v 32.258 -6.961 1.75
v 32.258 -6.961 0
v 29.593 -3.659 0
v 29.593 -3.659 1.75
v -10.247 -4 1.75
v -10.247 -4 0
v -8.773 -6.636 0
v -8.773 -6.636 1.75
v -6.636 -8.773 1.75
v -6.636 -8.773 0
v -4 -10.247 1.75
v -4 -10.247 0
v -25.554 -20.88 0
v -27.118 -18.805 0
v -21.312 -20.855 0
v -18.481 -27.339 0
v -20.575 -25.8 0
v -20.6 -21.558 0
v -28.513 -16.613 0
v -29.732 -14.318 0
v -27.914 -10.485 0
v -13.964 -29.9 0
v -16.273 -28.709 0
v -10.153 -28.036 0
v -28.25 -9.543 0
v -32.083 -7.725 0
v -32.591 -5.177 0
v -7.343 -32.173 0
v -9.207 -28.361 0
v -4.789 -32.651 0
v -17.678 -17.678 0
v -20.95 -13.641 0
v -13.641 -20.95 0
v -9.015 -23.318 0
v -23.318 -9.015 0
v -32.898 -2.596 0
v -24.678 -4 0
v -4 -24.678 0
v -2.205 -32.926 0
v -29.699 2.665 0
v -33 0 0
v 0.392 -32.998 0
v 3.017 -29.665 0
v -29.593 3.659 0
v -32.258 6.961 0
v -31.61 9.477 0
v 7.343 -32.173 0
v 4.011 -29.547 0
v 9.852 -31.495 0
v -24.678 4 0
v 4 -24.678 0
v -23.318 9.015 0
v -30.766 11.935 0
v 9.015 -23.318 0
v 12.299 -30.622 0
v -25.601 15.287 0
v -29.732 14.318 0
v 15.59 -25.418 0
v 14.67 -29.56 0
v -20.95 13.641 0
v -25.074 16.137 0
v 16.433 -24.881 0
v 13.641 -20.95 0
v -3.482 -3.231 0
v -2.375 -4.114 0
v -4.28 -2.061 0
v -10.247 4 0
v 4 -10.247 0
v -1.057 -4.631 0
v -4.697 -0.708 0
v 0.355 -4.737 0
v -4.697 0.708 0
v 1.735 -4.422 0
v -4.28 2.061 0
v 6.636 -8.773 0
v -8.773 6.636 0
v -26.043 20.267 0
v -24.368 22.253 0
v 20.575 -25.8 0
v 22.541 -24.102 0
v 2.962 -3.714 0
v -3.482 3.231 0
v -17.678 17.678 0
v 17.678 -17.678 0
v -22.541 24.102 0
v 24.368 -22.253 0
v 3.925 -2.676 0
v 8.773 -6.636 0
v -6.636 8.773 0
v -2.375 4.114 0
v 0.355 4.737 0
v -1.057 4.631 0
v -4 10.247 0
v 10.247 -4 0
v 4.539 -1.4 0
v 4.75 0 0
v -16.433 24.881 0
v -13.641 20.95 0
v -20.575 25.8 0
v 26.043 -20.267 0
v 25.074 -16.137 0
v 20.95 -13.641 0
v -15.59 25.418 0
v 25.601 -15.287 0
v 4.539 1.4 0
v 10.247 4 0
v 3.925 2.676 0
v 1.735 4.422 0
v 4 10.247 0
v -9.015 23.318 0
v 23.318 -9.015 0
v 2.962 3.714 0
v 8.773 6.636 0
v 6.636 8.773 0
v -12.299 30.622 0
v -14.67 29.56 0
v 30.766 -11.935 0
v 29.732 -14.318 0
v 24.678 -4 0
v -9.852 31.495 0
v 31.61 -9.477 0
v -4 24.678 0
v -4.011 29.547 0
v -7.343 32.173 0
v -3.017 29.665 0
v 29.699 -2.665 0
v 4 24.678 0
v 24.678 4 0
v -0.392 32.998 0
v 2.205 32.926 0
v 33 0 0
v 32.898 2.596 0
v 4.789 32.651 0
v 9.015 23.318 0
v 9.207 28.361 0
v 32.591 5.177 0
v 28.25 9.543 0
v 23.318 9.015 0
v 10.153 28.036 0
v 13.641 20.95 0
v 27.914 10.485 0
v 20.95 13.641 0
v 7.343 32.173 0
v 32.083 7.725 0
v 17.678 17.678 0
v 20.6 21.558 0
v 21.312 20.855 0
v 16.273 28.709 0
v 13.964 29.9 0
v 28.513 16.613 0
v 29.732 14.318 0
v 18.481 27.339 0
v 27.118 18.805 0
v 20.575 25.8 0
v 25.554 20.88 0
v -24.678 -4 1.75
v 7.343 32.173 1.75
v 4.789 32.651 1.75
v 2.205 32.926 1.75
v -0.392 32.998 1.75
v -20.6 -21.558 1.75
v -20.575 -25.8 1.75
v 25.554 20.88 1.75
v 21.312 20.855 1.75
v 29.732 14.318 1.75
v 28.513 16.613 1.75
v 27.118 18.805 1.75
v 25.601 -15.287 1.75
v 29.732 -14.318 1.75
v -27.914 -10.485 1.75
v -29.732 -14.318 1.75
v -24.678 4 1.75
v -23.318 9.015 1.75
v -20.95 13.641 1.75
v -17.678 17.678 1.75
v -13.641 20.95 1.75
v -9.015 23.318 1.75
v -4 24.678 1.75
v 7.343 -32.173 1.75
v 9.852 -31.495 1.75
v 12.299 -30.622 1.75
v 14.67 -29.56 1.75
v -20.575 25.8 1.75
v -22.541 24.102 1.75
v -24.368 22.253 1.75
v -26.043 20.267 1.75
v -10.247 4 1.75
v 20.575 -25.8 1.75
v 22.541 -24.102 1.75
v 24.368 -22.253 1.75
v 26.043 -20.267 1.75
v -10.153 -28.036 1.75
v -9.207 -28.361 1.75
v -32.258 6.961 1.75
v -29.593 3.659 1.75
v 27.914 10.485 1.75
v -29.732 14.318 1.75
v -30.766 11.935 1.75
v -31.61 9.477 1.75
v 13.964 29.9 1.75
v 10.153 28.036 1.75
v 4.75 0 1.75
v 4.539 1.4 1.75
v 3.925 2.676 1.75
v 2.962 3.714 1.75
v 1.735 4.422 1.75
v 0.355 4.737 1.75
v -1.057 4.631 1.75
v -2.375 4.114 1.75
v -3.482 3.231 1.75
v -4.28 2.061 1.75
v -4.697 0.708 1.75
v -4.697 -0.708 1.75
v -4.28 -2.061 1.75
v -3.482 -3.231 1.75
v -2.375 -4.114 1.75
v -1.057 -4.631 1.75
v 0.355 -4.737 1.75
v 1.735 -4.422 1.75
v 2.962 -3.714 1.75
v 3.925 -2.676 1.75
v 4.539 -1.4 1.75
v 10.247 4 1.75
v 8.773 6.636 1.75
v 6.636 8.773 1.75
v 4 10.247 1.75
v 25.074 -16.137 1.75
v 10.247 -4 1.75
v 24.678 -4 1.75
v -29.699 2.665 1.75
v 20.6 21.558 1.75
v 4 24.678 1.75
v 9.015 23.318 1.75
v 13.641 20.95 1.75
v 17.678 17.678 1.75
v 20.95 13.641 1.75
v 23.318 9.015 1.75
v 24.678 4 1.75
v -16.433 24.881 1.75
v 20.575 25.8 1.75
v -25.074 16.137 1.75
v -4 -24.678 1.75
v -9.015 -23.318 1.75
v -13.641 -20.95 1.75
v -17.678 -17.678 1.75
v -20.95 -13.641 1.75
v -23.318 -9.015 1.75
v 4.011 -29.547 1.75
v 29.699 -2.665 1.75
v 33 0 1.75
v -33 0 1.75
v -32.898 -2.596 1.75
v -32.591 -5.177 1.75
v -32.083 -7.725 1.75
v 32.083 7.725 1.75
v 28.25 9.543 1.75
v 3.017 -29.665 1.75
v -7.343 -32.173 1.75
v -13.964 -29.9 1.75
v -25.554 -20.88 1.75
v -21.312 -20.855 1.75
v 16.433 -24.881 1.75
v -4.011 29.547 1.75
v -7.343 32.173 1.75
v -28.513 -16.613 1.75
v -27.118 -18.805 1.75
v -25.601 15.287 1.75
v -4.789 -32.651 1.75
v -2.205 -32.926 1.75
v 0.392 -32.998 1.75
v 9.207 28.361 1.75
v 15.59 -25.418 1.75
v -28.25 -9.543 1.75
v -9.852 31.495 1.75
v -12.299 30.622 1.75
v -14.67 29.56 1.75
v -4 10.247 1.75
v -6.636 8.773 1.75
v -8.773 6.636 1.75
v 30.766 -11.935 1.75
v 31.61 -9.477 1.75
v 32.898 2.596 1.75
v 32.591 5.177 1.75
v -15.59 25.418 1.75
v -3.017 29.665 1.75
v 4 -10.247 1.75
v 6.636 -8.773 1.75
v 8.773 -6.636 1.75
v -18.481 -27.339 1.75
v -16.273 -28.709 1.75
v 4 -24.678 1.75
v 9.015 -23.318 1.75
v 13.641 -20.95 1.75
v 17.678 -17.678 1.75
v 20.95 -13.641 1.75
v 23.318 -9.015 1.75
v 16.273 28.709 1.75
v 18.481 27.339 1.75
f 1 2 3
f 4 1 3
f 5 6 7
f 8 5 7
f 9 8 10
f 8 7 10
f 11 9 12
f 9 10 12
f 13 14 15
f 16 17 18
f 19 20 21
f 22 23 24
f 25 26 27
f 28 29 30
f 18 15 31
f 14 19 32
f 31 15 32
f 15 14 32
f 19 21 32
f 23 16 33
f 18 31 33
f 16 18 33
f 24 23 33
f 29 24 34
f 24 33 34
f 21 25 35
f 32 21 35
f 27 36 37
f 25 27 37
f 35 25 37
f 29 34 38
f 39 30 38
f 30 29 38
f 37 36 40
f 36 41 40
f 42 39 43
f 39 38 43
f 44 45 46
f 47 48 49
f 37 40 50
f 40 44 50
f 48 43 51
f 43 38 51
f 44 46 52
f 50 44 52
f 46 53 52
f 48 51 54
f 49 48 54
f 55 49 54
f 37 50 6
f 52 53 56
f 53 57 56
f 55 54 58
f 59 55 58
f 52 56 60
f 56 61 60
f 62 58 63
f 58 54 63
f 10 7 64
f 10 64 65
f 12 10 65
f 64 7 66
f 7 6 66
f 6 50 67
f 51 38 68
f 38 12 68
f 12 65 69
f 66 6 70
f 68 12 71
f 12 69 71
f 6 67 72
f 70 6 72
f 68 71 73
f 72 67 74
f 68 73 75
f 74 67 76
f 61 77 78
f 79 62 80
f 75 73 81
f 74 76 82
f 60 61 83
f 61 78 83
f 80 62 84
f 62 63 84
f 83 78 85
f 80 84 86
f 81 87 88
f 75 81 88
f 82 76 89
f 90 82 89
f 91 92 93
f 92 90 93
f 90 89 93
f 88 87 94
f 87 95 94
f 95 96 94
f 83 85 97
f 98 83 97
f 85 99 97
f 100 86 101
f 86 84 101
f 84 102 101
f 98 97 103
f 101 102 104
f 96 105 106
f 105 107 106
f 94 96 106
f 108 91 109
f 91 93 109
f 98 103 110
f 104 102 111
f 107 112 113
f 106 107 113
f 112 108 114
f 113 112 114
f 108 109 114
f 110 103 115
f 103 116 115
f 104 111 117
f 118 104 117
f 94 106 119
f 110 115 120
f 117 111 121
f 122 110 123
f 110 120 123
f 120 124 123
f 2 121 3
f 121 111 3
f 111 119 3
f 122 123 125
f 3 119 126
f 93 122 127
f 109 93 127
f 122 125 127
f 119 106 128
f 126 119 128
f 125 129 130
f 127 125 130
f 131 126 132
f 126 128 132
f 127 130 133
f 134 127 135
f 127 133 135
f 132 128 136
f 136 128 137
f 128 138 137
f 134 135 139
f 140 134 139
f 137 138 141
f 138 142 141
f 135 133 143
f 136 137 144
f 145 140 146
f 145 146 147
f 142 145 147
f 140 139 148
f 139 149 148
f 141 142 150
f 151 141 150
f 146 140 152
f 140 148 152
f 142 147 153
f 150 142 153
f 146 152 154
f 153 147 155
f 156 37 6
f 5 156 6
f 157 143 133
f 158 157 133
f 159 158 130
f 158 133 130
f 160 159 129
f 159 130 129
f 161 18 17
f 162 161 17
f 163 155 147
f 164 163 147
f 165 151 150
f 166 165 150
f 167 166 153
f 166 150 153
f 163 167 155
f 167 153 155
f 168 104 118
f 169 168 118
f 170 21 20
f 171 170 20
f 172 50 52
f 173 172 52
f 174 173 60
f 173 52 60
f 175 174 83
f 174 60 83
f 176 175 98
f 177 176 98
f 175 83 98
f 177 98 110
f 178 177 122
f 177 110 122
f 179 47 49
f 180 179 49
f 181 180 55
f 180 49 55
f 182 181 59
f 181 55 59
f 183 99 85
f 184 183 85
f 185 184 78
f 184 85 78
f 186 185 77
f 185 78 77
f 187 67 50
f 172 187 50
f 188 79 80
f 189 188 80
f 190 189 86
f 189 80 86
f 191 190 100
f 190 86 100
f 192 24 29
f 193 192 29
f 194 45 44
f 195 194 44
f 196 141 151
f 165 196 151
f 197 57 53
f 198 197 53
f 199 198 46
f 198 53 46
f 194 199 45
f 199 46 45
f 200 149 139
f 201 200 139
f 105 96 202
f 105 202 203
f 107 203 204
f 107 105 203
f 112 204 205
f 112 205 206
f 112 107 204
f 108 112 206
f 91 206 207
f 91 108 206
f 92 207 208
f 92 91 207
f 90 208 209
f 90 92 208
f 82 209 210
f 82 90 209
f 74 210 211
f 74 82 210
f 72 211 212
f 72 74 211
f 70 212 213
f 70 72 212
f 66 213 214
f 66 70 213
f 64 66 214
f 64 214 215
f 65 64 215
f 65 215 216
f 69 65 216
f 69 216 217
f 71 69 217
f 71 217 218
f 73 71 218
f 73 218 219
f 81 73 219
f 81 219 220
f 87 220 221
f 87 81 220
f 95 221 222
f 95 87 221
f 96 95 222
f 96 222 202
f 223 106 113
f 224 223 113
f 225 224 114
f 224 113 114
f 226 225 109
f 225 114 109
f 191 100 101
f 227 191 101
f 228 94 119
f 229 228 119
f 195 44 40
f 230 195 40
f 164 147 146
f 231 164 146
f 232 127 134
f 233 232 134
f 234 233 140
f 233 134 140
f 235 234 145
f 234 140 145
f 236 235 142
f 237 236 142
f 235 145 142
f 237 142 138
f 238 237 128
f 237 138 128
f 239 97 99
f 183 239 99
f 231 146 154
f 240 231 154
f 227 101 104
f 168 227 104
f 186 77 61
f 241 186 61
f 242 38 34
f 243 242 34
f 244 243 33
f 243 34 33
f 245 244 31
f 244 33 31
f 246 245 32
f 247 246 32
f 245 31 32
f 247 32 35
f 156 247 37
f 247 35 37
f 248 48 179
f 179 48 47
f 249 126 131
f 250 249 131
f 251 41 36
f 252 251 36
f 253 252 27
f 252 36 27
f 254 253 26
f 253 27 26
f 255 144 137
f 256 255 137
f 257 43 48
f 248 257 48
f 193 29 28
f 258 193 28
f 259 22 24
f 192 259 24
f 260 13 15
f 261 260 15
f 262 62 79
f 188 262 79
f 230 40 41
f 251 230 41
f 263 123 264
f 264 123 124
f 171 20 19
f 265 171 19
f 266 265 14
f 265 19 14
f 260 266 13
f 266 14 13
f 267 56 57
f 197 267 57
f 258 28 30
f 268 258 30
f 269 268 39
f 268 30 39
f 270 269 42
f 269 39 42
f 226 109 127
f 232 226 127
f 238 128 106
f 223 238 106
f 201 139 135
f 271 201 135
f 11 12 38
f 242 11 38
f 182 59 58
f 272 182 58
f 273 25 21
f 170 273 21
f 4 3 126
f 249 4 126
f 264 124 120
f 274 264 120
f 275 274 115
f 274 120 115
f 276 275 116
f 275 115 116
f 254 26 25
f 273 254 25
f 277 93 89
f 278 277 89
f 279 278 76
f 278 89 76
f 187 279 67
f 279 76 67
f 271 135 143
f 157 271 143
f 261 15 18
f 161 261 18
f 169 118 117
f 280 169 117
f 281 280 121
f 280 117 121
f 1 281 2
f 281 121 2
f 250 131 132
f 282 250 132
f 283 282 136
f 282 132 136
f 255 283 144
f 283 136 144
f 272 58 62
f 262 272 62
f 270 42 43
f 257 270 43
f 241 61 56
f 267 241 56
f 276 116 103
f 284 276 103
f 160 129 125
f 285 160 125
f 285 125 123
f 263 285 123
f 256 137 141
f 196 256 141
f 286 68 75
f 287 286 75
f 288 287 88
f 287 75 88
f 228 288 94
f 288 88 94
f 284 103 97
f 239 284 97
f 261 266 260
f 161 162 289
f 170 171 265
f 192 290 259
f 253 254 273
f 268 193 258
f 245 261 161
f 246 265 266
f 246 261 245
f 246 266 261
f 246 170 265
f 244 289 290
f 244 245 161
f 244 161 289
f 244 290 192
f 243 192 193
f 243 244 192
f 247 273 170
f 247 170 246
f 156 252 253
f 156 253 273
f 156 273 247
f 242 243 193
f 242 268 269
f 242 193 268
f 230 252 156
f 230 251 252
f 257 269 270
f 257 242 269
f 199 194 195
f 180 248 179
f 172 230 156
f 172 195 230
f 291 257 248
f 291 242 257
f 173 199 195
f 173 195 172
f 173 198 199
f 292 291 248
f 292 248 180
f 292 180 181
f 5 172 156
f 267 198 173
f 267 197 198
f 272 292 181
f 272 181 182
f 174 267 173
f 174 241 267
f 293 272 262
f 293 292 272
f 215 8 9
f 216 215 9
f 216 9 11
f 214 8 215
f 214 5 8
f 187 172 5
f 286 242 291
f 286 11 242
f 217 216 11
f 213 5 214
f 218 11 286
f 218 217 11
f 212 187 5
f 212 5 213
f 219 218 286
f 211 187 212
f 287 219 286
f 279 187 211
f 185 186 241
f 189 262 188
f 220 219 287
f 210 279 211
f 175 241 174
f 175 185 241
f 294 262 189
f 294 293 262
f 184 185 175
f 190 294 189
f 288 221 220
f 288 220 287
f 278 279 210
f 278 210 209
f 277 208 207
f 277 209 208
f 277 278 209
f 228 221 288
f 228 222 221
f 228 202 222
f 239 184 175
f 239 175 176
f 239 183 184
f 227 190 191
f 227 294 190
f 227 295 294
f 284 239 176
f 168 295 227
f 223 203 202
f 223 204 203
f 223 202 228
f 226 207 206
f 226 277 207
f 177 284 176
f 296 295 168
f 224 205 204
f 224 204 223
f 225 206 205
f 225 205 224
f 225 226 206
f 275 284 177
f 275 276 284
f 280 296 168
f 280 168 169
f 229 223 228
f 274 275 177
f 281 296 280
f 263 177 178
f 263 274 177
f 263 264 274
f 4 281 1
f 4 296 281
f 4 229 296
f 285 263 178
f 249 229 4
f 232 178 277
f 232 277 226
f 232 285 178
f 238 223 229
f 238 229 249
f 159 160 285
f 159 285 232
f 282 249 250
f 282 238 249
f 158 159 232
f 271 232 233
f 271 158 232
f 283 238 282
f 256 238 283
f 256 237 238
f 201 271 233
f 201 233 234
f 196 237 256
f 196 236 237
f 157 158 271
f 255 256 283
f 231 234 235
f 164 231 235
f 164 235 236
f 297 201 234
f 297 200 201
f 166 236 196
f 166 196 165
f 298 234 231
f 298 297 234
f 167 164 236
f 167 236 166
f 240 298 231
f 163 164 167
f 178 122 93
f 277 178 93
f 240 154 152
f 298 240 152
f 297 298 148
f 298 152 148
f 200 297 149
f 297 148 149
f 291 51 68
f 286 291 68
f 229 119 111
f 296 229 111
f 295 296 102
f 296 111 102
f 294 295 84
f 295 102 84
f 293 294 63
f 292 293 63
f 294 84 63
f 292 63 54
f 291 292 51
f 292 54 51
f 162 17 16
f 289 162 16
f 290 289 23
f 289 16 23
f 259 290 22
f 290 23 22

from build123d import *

# Parameters (mm, degrees)
SKETCH1_R           = 4.75
BOSS_EXTRUDE1_DEPTH = 1.75


with BuildPart() as part:
    # Sketch1 → Boss-Extrude1 (new body)
    with BuildSketch(Plane.XY):
        with BuildLine():
            Line((-29.69873918, 2.664897184), (-33, 0))
            ThreePointArc((-33, 0), (-32.769980082, -3.889525088), (-32.083126945, -7.724827859))
            Line((-32.083126945, -7.724827859), (-28.249774158, -9.542905528))
            Line((-28.249774158, -9.542905528), (-27.913894972, -10.484810604))
            Line((-27.913894972, -10.484810604), (-29.731972641, -14.318163391))
            ThreePointArc((-29.731972641, -14.318163391), (-27.837130167, -17.722702504), (-25.554221367, -20.880176492))
            Line((-25.554221367, -20.880176492), (-21.311655509, -20.854978431))
            Line((-21.311655509, -20.854978431), (-20.600361522, -21.557873064))
            Line((-20.600361522, -21.557873064), (-20.575163461, -25.800438921))
            ThreePointArc((-20.575163461, -25.800438921), (-17.390795223, -28.045681335), (-13.963988845, -29.899950092))
            Line((-13.963988845, -29.899950092), (-10.152502116, -28.036467086))
            Line((-10.152502116, -28.036467086), (-9.206673827, -28.361134373))
            Line((-9.206673827, -28.361134373), (-7.343190821, -32.172621102))
            ThreePointArc((-7.343190821, -32.172621102), (-3.5, -32.813869019), (0.391982924, -32.997671878))
            Line((0.391982924, -32.997671878), (3.017478833, -29.66498959))
            Line((3.017478833, -29.66498959), (4.010508532, -29.547125193))
            Line((4.010508532, -29.547125193), (7.343190821, -32.172621102))
            ThreePointArc((7.343190821, -32.172621102), (11.084013147, -31.082867509), (14.670317668, -29.559800059))
            Line((14.670317668, -29.559800059), (15.589811092, -25.417997089))
            Line((15.589811092, -25.417997089), (16.433360491, -24.880945498))
            Line((16.433360491, -24.880945498), (20.575163461, -25.800438921))
            ThreePointArc((20.575163461, -25.800438921), (23.472701554, -23.195522882), (26.043016078, -20.26724731))
            Line((26.043016078, -20.26724731), (25.074390068, -16.136658532))
            Line((25.074390068, -16.136658532), (25.601383863, -15.286789401))
            Line((25.601383863, -15.286789401), (29.731972641, -14.318163391))
            ThreePointArc((29.731972641, -14.318163391), (31.212333545, -10.714020473), (32.257575758, -6.960517671))
            Line((32.257575758, -6.960517671), (29.592678574, -3.659256851))
            Line((29.592678574, -3.659256851), (29.69873918, -2.664897184))
            Line((29.69873918, -2.664897184), (33, 0))
            ThreePointArc((33, 0), (32.769980082, 3.889525088), (32.083126945, 7.724827859))
            Line((32.083126945, 7.724827859), (28.249774158, 9.542905528))
            Line((28.249774158, 9.542905528), (27.913894972, 10.484810604))
            Line((27.913894972, 10.484810604), (29.731972641, 14.318163391))
            ThreePointArc((29.731972641, 14.318163391), (27.837130167, 17.722702504), (25.554221367, 20.880176492))
            Line((25.554221367, 20.880176492), (21.311655509, 20.854978431))
            Line((21.311655509, 20.854978431), (20.600361522, 21.557873064))
            Line((20.600361522, 21.557873064), (20.575163461, 25.800438921))
            ThreePointArc((20.575163461, 25.800438921), (17.390795223, 28.045681335), (13.963988845, 29.899950092))
            Line((13.963988845, 29.899950092), (10.152502116, 28.036467086))
            Line((10.152502116, 28.036467086), (9.206673827, 28.361134373))
            Line((9.206673827, 28.361134373), (7.343190821, 32.172621102))
            ThreePointArc((7.343190821, 32.172621102), (3.5, 32.813869019), (-0.391982924, 32.997671878))
            Line((-0.391982924, 32.997671878), (-3.017478833, 29.66498959))
            Line((-3.017478833, 29.66498959), (-4.010508532, 29.547125193))
            Line((-4.010508532, 29.547125193), (-7.343190821, 32.172621102))
            ThreePointArc((-7.343190821, 32.172621102), (-11.084013147, 31.082867509), (-14.670317668, 29.559800059))
            Line((-14.670317668, 29.559800059), (-15.589811092, 25.417997089))
            Line((-15.589811092, 25.417997089), (-16.433360491, 24.880945498))
            Line((-16.433360491, 24.880945498), (-20.575163461, 25.800438921))
            ThreePointArc((-20.575163461, 25.800438921), (-23.472701554, 23.195522882), (-26.043016078, 20.26724731))
            Line((-26.043016078, 20.26724731), (-25.074390068, 16.136658532))
            Line((-25.074390068, 16.136658532), (-25.601383863, 15.286789401))
            Line((-25.601383863, 15.286789401), (-29.731972641, 14.318163391))
            ThreePointArc((-29.731972641, 14.318163391), (-31.212333545, 10.714020473), (-32.257575758, 6.960517671))
            Line((-32.257575758, 6.960517671), (-29.592678574, 3.659256851))
            Line((-29.592678574, 3.659256851), (-29.69873918, 2.664897184))
        make_face()
        with BuildLine():
            Line((-24.677925359, -4), (-10.246950766, -4))
            ThreePointArc((-10.246950766, -4), (-7.778174593, -7.778174593), (-4, -10.246950766))
            Line((-4, -10.246950766), (-4, -24.677925359))
            ThreePointArc((-4, -24.677925359), (-17.67766953, -17.67766953), (-24.677925359, -4))
        make_face(mode=Mode.SUBTRACT)
        with BuildLine():
            Line((4, -24.677925359), (4, -10.246950766))
            ThreePointArc((4, -10.246950766), (7.778174593, -7.778174593), (10.246950766, -4))
            Line((10.246950766, -4), (24.677925359, -4))
            ThreePointArc((24.677925359, -4), (17.67766953, -17.67766953), (4, -24.677925359))
        make_face(mode=Mode.SUBTRACT)
        with BuildLine():
            Line((24.677925359, 4), (10.246950766, 4))
            ThreePointArc((10.246950766, 4), (7.778174593, 7.778174593), (4, 10.246950766))
            Line((4, 10.246950766), (4, 24.677925359))
            ThreePointArc((4, 24.677925359), (17.67766953, 17.67766953), (24.677925359, 4))
        make_face(mode=Mode.SUBTRACT)
        with BuildLine():
            Line((-4, 24.677925359), (-4, 10.246950766))
            ThreePointArc((-4, 10.246950766), (-7.778174593, 7.778174593), (-10.246950766, 4))
            Line((-10.246950766, 4), (-24.677925359, 4))
            ThreePointArc((-24.677925359, 4), (-17.67766953, 17.67766953), (-4, 24.677925359))
        make_face(mode=Mode.SUBTRACT)
        Circle(SKETCH1_R, mode=Mode.SUBTRACT)
    extrude(amount=BOSS_EXTRUDE1_DEPTH)


solid = part.part
